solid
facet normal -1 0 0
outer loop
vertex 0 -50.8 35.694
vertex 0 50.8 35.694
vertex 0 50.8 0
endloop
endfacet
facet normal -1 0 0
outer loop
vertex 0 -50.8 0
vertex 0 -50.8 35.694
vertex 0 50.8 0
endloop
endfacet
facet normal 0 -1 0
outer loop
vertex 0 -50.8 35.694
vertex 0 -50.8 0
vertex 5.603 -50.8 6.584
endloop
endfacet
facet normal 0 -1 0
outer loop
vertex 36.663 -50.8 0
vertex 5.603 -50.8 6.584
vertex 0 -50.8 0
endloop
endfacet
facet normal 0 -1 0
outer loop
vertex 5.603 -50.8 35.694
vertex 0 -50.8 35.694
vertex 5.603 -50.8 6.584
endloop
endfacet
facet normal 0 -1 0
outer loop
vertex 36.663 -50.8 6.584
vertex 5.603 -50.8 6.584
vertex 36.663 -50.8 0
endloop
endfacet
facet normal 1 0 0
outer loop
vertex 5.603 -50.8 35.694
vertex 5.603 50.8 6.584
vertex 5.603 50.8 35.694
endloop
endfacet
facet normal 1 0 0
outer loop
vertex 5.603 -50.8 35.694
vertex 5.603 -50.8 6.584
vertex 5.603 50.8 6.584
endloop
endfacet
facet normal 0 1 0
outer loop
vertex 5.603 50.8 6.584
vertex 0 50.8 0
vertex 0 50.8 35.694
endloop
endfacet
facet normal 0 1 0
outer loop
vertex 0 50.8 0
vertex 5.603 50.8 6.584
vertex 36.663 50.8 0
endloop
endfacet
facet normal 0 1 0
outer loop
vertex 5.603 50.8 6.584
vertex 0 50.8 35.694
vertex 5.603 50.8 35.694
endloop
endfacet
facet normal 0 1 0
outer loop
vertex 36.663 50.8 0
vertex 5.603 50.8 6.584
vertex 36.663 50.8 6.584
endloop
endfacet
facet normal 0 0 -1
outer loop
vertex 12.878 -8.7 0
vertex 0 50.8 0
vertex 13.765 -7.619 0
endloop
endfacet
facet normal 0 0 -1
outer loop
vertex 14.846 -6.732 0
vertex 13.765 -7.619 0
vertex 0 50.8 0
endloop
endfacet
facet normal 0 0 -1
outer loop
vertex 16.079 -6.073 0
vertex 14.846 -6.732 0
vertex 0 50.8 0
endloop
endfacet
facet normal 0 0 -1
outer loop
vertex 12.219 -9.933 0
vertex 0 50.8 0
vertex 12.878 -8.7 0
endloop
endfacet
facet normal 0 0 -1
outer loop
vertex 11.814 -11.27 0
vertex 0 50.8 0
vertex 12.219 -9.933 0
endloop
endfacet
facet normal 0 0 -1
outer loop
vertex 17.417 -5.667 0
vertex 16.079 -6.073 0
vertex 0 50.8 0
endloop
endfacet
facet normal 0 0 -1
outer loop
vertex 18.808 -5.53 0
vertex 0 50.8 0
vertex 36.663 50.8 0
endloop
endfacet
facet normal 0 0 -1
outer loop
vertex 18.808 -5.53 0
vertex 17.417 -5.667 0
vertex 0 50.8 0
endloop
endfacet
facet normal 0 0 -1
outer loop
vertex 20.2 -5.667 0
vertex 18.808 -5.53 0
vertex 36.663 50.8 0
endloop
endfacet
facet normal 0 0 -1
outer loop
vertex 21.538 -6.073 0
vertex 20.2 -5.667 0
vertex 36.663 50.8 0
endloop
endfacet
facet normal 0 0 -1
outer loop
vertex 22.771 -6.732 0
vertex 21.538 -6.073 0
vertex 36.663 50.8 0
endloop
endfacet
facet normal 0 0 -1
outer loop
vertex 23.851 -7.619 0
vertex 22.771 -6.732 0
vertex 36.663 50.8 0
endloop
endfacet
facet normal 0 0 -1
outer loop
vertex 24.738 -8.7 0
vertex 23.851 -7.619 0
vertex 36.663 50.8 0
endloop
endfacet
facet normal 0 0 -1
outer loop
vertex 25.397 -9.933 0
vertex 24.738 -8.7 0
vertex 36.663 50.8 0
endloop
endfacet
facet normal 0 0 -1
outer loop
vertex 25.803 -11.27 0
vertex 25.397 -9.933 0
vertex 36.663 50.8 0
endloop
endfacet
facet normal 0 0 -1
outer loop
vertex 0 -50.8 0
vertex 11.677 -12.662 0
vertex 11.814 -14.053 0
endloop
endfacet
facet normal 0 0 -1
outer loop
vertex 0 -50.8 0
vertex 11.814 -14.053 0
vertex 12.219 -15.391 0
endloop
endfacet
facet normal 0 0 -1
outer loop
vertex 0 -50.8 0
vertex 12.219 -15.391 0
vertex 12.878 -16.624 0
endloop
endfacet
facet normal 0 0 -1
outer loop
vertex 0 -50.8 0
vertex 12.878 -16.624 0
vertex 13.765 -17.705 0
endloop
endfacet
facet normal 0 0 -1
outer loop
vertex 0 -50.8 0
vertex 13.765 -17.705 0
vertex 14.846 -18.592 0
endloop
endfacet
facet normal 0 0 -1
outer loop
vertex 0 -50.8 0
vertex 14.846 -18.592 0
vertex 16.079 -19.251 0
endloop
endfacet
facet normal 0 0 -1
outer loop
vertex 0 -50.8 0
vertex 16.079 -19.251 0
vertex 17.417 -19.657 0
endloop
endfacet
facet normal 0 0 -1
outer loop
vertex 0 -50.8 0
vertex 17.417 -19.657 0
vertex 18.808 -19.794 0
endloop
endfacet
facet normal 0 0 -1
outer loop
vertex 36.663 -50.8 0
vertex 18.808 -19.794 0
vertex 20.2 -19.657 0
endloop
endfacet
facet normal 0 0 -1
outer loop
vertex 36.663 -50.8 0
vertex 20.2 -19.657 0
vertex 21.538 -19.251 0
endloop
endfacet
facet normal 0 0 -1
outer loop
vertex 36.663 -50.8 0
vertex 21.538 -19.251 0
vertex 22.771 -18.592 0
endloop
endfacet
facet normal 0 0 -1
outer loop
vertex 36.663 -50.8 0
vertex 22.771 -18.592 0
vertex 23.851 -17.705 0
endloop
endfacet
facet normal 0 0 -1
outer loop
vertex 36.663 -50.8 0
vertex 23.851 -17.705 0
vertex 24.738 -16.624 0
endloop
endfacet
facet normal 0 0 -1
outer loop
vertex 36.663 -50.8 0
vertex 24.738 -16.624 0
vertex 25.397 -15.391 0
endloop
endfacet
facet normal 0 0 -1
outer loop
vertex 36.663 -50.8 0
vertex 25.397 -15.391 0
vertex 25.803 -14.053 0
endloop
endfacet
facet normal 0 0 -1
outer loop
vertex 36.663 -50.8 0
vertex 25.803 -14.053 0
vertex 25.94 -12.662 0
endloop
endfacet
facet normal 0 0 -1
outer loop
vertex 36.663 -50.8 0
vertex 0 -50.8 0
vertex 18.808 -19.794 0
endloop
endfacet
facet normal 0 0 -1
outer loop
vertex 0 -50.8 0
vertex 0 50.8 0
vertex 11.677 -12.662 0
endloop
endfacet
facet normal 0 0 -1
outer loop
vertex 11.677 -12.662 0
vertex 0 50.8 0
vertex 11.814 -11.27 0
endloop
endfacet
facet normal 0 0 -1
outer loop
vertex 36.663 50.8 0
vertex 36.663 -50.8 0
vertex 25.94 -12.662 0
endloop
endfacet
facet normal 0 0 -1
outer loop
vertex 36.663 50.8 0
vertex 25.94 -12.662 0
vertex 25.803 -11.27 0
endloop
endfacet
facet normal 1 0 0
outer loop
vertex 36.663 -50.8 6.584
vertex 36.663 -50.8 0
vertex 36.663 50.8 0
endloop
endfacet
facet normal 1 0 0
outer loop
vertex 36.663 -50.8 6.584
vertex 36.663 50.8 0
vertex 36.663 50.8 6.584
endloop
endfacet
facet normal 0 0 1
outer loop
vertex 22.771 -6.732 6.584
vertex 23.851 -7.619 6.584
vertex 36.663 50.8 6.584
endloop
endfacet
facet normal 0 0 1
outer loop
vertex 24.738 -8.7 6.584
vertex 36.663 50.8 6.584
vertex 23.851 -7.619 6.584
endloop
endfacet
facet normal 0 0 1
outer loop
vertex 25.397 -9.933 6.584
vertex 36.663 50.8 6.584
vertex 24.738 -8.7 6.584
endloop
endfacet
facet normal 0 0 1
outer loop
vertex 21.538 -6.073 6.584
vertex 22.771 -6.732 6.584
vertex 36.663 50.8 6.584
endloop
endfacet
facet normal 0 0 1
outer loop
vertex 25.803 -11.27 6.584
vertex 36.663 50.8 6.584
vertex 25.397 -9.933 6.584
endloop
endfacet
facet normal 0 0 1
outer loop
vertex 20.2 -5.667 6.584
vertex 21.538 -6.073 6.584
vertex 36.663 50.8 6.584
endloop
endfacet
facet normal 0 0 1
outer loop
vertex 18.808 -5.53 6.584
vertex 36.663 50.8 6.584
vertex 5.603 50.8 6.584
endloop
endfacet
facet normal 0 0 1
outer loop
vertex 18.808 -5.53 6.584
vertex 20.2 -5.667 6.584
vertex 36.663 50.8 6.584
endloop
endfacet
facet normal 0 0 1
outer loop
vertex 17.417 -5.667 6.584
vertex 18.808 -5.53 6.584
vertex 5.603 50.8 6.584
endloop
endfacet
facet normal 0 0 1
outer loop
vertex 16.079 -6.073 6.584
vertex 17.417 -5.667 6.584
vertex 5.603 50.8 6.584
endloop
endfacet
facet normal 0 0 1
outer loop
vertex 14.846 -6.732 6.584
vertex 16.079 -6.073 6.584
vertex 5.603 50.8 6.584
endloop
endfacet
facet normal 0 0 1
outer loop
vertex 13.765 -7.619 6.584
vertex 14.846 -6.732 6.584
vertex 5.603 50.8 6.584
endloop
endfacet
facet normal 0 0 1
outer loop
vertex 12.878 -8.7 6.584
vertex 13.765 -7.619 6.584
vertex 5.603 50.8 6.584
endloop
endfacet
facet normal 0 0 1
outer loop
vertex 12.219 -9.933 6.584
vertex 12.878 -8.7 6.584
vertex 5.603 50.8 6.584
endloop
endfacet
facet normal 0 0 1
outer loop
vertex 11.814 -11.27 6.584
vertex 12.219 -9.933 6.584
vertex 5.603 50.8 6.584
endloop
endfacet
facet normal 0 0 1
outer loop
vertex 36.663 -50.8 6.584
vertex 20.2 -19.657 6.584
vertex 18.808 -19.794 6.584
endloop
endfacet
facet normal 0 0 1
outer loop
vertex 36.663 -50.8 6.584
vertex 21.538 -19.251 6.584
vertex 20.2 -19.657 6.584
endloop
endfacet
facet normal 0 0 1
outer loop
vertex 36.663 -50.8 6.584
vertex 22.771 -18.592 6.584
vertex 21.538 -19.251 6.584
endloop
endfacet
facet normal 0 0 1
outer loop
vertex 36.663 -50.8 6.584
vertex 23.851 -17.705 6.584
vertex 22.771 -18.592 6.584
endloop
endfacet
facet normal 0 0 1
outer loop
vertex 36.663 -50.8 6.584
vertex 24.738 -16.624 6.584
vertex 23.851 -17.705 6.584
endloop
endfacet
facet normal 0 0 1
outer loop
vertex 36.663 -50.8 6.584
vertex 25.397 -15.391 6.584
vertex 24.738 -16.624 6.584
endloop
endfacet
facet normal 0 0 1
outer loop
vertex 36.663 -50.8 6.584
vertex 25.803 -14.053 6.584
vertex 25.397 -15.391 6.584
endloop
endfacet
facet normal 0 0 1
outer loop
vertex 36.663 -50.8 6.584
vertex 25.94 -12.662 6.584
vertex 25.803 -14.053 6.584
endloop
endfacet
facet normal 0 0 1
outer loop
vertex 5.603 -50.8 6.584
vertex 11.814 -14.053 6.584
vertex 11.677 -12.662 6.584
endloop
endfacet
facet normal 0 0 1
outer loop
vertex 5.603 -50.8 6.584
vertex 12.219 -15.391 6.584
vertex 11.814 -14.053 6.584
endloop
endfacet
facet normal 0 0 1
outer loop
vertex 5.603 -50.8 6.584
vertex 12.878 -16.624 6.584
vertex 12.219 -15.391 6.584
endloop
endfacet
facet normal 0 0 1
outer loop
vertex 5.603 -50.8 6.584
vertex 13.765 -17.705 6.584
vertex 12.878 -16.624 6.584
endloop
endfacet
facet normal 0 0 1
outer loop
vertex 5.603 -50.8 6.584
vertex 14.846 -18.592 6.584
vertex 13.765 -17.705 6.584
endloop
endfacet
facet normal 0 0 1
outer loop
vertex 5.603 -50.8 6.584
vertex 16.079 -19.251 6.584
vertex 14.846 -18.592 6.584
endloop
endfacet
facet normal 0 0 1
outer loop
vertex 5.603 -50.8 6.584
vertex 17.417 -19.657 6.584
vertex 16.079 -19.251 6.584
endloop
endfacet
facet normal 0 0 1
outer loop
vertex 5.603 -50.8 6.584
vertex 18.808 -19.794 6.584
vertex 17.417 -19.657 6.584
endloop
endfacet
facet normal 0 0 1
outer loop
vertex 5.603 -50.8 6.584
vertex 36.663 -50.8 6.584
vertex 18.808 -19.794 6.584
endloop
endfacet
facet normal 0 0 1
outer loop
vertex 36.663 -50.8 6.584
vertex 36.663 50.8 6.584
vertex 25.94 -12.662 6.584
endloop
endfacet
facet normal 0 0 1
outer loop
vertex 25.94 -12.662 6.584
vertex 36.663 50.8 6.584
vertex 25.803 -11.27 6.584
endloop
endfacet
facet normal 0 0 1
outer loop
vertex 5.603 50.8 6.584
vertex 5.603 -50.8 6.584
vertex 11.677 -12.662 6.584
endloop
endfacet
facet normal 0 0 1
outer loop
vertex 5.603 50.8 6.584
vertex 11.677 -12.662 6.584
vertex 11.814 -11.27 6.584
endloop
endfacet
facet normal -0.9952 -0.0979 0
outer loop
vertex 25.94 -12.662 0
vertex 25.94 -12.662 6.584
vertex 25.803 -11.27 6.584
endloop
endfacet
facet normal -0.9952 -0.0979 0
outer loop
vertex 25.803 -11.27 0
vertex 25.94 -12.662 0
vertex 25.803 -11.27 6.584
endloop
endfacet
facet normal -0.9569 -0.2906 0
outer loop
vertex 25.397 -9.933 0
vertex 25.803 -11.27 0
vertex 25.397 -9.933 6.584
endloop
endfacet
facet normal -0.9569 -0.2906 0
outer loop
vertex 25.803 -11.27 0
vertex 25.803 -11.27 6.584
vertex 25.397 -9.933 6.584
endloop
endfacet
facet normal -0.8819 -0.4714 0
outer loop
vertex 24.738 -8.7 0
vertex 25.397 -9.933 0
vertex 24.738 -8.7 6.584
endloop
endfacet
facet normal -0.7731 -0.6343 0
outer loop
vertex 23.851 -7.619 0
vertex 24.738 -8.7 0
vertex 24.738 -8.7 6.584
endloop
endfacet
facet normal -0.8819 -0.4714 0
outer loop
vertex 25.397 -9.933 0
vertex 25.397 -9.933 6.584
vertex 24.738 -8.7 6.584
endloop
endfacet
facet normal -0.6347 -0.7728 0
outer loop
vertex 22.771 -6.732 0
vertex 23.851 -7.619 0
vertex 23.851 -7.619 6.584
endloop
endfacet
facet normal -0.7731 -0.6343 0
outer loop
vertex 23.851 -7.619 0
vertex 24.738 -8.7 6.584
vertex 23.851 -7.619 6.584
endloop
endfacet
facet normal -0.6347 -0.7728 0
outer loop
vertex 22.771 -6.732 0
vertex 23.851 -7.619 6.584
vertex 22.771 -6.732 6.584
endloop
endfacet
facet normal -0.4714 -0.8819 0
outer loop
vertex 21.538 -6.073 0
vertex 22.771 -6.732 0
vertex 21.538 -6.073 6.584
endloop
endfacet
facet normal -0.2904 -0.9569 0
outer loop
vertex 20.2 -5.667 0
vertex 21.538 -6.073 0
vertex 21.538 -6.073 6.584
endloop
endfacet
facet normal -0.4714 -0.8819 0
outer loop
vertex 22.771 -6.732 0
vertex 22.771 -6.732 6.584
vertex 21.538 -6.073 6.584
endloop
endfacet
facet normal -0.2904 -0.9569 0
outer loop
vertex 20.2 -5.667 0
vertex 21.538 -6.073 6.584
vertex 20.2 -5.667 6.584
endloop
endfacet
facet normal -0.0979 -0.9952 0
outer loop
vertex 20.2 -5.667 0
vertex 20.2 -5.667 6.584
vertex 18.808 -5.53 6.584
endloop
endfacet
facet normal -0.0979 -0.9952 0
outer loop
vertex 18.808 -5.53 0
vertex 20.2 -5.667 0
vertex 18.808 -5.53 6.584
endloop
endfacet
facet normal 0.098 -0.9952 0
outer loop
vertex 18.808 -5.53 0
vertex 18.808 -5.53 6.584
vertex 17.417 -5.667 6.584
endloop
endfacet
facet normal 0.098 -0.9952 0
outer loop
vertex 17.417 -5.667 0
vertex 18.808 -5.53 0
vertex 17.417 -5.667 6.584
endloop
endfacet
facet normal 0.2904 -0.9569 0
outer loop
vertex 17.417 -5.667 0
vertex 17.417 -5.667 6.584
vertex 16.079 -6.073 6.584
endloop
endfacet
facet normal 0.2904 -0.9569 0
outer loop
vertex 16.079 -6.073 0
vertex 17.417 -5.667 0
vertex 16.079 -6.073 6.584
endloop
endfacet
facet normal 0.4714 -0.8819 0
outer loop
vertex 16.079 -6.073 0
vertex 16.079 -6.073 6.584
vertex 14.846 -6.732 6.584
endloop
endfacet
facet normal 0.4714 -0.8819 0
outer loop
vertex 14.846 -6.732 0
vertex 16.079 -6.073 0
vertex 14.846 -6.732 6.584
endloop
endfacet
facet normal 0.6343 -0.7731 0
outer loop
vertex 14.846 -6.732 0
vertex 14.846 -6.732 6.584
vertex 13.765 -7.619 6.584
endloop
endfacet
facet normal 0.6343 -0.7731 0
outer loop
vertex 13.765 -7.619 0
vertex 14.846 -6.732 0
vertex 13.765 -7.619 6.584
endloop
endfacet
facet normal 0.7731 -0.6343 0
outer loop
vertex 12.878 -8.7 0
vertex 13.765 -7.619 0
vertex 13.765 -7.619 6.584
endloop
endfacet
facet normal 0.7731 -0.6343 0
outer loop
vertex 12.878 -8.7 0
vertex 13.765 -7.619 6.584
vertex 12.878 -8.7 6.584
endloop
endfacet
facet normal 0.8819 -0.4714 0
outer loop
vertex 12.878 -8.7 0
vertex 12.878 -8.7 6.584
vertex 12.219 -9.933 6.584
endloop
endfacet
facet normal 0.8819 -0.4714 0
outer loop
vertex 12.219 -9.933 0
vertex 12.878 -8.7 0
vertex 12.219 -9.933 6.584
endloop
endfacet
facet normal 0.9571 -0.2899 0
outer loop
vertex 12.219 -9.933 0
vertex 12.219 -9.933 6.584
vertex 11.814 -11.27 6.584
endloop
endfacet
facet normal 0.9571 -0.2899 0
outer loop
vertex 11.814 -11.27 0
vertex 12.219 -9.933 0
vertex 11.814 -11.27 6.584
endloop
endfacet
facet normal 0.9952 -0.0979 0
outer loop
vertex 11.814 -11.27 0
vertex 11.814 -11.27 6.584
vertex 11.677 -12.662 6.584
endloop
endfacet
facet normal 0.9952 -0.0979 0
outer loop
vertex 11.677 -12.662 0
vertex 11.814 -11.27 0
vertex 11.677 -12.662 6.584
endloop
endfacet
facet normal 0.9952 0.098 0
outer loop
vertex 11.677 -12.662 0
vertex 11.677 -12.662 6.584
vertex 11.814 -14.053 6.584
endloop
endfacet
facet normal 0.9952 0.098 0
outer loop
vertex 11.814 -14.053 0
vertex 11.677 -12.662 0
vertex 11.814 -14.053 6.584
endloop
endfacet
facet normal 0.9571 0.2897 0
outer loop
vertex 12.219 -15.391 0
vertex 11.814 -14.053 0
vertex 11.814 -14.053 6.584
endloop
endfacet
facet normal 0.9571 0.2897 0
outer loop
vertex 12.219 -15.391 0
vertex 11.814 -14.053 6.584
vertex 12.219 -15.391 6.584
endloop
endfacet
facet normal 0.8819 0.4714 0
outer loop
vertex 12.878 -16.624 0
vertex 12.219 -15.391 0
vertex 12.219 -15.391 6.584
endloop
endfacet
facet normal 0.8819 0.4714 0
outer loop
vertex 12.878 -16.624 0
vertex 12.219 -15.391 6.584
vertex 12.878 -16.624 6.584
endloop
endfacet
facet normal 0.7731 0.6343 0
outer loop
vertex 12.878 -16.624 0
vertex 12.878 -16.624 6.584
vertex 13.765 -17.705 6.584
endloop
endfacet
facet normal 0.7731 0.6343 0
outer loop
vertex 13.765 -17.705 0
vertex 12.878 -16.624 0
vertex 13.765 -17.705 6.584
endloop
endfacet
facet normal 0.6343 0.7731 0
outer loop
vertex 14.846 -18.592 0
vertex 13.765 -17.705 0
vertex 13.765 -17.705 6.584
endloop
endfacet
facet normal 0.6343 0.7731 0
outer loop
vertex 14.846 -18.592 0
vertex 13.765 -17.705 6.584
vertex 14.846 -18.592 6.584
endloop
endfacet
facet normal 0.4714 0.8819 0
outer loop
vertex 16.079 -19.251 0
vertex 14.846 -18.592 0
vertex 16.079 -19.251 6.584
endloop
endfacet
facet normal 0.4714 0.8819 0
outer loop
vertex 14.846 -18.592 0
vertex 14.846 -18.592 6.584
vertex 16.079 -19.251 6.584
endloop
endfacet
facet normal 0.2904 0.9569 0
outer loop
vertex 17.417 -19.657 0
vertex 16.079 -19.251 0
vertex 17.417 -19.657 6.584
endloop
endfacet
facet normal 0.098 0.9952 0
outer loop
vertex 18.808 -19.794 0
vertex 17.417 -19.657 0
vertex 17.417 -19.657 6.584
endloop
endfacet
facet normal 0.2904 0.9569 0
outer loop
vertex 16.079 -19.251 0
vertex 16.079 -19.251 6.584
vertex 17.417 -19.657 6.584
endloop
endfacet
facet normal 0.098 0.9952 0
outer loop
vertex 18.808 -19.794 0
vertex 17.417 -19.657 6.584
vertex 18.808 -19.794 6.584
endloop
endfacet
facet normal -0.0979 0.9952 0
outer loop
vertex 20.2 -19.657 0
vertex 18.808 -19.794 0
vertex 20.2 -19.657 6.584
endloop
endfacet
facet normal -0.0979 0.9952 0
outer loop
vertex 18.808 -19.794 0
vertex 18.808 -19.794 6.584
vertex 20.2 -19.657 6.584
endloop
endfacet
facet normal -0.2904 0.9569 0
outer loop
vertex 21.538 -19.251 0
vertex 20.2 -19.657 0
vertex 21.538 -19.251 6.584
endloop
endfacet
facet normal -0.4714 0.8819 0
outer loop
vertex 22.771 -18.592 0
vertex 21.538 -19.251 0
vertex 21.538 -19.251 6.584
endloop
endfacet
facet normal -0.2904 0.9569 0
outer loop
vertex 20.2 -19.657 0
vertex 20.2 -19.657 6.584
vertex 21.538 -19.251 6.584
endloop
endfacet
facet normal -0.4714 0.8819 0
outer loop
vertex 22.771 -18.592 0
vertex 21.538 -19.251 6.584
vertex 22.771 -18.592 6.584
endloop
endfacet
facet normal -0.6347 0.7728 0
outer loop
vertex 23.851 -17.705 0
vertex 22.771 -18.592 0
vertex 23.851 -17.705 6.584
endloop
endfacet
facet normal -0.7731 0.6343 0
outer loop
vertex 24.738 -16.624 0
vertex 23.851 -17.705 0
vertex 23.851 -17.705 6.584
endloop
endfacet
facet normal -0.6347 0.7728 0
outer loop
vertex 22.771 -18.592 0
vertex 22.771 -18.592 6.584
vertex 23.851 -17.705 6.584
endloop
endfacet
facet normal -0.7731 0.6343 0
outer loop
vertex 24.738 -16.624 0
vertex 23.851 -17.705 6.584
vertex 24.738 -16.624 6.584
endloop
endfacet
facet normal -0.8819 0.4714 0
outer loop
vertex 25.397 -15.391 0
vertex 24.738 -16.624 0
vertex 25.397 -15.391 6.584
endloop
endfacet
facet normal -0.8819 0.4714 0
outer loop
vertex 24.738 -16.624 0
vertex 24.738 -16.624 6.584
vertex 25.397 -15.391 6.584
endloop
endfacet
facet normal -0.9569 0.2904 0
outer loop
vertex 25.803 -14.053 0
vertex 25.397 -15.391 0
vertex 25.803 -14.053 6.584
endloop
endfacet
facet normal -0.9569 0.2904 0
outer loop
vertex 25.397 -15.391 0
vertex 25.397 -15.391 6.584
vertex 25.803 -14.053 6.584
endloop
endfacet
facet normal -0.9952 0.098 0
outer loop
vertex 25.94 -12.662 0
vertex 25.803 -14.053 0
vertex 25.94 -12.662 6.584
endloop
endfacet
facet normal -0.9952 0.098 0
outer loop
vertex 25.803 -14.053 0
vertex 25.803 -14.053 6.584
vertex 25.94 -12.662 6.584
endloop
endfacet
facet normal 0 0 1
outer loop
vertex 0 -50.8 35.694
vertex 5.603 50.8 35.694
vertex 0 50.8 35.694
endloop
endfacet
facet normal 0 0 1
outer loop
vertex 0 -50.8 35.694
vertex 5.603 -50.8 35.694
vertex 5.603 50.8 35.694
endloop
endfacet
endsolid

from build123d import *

# Parameters (mm, degrees)
F1_DEPTH = 50.8
F2_R     = 7.1318057121
F3_DEPTH = 25.4


with BuildPart() as f1:
    # F0 (on Front) → F1 (new body, symmetric)
    with BuildSketch(Plane.XZ):
        Polygon((0, 35.6939397752), (0, 0), (36.6625972092, 0), (36.6625972092, 6.5840519965), (5.6025939994, 6.5840519965), (5.6025939994, 35.6939397752), align=None)
    extrude(amount=F1_DEPTH, both=True)

    # F2 (on face) → F3 (cut)
    with BuildSketch(Plane.XY.offset(6.5840519965)):
        with Locations((18.8083481044, -12.6618258655)):
            Circle(F2_R)
    extrude(amount=-F3_DEPTH, mode=Mode.SUBTRACT)


solid = f1.part
